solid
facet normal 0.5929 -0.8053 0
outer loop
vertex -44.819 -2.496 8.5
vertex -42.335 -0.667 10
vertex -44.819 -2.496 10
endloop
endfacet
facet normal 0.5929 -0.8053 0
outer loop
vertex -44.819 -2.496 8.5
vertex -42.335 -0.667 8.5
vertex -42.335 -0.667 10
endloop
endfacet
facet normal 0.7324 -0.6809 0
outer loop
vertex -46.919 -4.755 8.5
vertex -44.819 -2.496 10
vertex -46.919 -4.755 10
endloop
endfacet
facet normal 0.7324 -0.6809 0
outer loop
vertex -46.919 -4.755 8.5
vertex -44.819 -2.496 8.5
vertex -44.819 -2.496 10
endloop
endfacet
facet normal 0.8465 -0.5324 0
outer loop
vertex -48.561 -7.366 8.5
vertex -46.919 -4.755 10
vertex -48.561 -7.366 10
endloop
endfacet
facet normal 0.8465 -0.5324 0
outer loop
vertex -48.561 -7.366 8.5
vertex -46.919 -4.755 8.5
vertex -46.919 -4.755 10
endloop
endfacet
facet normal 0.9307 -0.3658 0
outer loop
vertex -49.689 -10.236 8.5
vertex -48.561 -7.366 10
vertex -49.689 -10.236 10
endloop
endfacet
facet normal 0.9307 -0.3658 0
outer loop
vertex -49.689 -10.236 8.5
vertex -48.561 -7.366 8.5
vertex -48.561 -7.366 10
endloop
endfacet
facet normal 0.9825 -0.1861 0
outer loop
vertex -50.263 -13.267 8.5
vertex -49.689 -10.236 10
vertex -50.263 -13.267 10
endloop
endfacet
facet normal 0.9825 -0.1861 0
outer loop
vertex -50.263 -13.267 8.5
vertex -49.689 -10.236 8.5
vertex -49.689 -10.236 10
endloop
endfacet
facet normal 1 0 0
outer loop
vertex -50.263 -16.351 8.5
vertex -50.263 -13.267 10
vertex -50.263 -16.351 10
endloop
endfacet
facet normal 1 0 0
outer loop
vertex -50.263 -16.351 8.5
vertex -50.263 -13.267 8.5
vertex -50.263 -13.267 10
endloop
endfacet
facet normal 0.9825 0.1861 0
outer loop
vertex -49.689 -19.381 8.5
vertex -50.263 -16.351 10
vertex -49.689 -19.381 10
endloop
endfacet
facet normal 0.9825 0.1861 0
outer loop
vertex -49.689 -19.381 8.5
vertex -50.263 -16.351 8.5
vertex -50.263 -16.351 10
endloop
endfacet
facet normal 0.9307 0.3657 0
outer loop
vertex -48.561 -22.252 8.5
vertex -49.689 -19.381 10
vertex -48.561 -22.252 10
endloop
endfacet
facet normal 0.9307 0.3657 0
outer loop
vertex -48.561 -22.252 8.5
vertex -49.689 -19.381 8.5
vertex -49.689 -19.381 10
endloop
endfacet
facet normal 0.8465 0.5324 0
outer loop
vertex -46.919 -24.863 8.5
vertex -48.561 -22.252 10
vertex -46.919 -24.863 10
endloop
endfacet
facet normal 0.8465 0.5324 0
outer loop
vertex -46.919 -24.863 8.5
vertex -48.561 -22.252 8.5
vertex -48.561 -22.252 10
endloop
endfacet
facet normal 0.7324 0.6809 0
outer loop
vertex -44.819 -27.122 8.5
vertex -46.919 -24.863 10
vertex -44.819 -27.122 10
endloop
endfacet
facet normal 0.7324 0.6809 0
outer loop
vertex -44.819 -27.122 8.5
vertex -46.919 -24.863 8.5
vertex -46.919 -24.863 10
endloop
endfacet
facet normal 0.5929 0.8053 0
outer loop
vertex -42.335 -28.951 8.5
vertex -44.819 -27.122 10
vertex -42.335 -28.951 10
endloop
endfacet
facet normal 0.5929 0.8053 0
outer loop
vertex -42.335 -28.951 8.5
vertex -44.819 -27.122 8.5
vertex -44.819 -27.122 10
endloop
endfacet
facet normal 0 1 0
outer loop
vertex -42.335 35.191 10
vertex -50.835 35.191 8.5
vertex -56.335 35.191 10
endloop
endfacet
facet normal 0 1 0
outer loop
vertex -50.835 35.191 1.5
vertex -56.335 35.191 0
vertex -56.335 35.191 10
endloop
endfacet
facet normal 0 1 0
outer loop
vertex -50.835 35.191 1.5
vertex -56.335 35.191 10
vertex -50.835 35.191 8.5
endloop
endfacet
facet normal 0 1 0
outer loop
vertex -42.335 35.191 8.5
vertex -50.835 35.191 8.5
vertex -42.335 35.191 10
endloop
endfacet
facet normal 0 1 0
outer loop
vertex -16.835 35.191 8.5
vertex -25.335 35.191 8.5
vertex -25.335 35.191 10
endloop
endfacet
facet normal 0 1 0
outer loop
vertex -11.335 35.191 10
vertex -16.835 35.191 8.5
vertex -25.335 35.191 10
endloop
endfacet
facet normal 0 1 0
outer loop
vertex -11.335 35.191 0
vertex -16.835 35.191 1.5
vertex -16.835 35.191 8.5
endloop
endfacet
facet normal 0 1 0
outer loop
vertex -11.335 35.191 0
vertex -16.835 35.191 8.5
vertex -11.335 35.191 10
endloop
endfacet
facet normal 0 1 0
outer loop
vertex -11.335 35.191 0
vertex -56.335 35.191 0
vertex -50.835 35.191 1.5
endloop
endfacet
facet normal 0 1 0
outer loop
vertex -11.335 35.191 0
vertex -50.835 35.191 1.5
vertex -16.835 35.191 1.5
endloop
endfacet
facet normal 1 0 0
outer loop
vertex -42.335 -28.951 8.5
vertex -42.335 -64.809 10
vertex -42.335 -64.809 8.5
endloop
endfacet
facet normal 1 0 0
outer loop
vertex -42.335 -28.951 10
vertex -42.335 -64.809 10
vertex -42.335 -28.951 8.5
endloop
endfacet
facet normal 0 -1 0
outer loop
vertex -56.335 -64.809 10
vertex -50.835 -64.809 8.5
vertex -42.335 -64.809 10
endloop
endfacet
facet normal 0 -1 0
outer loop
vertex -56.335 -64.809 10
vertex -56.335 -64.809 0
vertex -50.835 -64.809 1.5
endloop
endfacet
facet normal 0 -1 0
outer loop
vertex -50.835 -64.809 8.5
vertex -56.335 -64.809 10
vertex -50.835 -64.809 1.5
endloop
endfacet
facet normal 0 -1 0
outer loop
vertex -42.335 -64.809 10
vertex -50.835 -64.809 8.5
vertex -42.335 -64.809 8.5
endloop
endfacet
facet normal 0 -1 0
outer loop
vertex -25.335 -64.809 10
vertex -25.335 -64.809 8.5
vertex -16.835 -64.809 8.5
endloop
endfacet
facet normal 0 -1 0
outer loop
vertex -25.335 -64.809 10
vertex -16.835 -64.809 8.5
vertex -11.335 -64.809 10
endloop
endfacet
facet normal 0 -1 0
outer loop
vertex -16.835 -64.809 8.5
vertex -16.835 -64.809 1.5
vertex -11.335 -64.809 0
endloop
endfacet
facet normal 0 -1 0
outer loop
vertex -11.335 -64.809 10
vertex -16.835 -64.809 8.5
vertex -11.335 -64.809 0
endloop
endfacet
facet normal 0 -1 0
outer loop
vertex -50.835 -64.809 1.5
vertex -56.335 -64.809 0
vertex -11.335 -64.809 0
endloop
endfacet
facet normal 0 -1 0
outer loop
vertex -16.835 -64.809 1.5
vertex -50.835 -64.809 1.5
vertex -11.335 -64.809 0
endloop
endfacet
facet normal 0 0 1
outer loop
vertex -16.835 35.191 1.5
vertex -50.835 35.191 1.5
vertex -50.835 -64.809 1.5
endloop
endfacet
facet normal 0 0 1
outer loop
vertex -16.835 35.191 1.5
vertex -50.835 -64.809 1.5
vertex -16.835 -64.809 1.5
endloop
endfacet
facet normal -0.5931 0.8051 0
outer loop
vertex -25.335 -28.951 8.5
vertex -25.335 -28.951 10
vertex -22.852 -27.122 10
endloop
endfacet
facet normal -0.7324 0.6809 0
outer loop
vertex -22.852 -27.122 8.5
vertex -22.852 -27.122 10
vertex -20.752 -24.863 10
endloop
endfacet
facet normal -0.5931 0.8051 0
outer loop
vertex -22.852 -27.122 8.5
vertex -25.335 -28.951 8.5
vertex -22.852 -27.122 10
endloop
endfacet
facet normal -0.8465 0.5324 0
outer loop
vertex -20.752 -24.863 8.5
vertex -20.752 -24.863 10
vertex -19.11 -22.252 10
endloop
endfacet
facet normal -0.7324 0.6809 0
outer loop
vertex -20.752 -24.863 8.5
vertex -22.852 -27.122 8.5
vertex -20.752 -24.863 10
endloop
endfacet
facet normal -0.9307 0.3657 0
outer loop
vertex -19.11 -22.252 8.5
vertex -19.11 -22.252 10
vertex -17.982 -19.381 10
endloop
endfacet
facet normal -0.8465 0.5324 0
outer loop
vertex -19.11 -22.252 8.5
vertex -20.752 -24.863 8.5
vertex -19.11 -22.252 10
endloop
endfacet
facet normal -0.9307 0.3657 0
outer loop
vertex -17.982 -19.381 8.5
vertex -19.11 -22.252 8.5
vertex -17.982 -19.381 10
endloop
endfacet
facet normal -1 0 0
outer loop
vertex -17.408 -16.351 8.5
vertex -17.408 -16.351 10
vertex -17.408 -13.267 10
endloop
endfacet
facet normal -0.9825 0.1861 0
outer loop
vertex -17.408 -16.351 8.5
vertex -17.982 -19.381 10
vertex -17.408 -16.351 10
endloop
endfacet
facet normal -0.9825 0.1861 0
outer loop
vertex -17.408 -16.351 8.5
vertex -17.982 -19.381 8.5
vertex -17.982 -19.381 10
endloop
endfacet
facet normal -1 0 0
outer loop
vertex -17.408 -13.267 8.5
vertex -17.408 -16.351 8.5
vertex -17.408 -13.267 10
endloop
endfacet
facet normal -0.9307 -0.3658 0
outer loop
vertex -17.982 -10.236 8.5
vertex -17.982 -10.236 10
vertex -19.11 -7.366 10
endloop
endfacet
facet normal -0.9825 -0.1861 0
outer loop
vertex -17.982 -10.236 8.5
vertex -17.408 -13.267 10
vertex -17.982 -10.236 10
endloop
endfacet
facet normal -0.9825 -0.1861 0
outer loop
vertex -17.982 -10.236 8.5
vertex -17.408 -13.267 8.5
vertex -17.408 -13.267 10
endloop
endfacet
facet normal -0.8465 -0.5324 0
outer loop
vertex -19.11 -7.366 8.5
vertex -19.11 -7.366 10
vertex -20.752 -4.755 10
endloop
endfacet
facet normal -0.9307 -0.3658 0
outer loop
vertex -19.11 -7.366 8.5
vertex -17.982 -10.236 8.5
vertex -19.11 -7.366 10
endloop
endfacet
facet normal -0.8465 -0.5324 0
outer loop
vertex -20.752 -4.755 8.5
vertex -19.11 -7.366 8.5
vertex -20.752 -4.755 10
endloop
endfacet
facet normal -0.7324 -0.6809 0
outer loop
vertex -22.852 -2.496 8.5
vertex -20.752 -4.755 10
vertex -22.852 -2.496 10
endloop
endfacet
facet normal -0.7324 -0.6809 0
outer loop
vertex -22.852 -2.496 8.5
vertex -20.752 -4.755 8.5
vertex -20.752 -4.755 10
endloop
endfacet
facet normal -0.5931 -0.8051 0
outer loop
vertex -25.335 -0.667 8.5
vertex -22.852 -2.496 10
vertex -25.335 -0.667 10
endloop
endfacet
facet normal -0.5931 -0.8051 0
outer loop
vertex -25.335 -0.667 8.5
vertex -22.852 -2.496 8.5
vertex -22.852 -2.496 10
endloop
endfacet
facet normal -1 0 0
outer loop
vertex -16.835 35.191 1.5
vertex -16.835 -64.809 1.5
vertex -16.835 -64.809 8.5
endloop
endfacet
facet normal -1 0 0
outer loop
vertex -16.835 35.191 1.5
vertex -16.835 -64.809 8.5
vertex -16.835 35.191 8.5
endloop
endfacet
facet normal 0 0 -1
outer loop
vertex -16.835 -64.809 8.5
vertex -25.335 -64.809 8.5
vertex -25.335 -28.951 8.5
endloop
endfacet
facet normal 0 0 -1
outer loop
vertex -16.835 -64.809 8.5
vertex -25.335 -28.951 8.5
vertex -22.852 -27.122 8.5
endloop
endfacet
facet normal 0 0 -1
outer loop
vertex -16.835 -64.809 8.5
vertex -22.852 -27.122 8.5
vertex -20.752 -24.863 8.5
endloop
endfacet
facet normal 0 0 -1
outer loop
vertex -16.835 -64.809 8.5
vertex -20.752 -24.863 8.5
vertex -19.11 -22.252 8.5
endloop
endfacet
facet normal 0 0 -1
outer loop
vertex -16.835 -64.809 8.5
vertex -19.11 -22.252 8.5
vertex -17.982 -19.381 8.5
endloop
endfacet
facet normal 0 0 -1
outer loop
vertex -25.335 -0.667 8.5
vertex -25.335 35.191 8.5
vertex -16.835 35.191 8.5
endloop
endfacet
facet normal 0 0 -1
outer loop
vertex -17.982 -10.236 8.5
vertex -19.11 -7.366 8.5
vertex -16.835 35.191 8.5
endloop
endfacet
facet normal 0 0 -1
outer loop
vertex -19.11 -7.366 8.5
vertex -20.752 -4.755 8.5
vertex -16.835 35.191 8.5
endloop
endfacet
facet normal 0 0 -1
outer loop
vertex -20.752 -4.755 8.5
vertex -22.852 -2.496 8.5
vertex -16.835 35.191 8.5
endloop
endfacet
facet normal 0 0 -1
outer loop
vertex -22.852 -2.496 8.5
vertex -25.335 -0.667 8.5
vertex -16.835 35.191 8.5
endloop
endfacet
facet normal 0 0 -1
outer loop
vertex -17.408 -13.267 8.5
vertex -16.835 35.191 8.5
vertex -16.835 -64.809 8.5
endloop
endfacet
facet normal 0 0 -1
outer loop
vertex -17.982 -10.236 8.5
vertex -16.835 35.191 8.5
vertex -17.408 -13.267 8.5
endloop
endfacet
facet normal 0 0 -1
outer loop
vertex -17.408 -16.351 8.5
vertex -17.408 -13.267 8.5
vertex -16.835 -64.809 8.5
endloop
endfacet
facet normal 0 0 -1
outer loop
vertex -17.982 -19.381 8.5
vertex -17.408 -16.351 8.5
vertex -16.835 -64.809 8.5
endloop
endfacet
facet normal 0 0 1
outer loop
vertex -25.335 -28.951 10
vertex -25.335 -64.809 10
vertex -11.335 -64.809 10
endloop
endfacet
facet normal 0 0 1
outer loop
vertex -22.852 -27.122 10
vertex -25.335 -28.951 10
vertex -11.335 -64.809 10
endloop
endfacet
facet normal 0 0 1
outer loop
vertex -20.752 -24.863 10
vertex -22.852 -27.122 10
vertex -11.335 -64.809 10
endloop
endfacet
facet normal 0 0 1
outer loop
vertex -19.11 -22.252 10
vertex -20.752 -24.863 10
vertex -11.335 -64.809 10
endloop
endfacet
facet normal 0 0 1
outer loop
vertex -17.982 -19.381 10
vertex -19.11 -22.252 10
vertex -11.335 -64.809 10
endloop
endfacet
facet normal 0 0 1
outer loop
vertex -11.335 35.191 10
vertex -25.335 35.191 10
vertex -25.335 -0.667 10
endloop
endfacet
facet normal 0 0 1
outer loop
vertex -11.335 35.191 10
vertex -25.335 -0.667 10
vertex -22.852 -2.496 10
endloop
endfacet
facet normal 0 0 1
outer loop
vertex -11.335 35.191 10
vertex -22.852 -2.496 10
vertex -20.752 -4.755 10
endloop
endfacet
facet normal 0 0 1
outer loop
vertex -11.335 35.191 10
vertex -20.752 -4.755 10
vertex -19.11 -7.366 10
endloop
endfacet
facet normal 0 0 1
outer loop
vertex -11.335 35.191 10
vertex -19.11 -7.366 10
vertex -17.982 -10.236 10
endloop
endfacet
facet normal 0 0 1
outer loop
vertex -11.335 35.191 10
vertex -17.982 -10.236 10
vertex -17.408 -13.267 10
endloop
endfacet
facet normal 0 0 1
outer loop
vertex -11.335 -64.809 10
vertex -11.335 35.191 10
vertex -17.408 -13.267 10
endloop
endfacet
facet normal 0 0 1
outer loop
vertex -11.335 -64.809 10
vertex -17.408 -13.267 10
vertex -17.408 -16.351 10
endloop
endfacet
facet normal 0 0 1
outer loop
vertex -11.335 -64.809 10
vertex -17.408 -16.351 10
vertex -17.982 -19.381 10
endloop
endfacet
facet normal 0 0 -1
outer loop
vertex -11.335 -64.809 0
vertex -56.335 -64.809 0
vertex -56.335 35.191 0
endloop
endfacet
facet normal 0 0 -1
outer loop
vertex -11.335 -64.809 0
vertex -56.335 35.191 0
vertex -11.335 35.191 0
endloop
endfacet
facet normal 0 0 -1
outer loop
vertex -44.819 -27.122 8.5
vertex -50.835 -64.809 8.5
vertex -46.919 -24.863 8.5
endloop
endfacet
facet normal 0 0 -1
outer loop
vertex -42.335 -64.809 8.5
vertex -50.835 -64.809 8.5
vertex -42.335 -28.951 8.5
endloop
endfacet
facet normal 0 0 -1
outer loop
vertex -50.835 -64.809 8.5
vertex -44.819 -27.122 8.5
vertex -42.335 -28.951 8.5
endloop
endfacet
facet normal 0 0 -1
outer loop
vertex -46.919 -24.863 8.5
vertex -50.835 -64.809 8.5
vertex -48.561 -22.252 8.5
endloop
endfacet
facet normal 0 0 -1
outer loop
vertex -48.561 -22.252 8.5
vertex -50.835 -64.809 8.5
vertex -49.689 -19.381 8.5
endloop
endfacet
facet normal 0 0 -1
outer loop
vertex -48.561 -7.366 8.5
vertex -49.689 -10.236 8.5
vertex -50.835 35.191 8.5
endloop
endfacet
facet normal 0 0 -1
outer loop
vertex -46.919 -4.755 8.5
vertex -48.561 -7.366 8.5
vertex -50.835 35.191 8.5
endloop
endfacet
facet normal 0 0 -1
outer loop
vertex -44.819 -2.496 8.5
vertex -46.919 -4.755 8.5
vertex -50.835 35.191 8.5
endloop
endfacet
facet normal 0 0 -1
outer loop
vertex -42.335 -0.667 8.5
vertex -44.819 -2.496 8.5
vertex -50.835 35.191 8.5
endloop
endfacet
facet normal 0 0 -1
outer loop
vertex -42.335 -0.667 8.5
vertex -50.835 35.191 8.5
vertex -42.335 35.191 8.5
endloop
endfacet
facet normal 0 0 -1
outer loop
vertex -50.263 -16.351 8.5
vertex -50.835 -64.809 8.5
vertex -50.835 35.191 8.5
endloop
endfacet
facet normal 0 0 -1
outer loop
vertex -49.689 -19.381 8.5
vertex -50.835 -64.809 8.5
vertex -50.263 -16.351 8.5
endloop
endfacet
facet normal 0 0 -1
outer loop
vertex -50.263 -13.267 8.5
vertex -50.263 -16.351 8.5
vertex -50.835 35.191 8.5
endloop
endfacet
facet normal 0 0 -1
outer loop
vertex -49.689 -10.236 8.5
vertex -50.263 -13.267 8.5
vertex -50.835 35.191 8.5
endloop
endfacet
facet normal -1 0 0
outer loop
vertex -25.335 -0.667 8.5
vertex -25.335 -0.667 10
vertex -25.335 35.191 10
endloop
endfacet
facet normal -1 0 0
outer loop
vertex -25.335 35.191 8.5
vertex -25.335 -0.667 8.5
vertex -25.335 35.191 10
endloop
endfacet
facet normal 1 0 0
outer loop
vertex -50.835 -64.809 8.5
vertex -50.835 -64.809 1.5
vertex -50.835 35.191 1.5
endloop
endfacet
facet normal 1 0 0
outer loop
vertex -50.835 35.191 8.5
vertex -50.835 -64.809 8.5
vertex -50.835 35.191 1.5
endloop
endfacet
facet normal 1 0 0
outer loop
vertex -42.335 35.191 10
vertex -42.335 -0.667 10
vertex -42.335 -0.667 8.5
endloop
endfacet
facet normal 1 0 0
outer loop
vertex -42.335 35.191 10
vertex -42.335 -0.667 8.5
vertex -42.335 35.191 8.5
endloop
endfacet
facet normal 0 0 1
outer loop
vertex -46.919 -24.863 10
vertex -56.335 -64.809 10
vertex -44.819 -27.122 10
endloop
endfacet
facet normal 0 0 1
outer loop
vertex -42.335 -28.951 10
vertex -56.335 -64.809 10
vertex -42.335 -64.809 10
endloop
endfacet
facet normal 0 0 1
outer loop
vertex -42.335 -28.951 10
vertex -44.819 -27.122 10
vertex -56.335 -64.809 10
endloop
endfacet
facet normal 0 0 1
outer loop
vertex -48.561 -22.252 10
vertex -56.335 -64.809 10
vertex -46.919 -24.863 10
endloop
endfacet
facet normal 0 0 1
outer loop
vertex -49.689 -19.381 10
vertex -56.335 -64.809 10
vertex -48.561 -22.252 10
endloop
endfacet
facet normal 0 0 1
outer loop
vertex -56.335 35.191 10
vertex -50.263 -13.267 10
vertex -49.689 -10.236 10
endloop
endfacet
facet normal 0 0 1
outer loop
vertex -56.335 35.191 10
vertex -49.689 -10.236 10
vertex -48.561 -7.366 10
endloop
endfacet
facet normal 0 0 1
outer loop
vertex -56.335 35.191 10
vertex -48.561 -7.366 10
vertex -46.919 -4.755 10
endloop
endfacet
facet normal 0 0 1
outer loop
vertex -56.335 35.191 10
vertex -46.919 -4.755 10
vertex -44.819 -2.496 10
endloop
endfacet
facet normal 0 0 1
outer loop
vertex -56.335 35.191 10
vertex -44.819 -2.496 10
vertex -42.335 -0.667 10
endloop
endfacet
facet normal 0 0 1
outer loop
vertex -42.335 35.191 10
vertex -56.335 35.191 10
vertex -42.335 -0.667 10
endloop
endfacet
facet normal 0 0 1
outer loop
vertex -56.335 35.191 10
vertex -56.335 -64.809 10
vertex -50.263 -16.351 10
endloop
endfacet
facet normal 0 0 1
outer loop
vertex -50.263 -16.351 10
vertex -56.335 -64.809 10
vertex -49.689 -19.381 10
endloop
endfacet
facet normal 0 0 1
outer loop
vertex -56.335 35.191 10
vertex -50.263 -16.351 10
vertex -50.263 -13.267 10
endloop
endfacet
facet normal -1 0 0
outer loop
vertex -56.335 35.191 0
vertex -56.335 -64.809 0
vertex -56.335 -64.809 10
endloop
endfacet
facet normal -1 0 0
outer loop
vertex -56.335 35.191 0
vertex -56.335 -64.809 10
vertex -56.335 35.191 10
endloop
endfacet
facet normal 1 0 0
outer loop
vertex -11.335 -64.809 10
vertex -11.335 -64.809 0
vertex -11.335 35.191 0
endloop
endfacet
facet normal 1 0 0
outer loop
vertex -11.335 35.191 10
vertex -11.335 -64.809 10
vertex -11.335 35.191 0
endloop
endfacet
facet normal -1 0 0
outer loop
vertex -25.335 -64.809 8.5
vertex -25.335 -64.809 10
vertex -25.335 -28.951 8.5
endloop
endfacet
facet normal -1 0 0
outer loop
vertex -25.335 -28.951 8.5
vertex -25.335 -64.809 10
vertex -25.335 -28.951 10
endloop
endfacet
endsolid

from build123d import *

# Parameters (mm, degrees)
F0_W     = 45
F0_H     = 100
F1_DEPTH = 10
F2_W     = 17
F2_H     = 100
F3_DEPTH = 8.5
F4_W     = 34
F4_H     = 100
F5_DEPTH = 7
F8_R     = 16.5
F9_DEPTH = 10


with BuildPart() as f1:
    # F0 (on Top) → F1 (new body)
    with BuildSketch(Plane.XY):
        with Locations((-33.835356, -14.808846)):
            Rectangle(F0_W, F0_H)
    extrude(amount=F1_DEPTH)

    # F2 (on face) → F3 (cut)
    with BuildSketch(Plane.XY.offset(10)):
        with Locations((-33.835356, -14.808846)):
            Rectangle(F2_W, F2_H)
    extrude(amount=-F3_DEPTH, mode=Mode.SUBTRACT)


with BuildPart() as f5:
    # F4 (on Top) → F5 (new body)
    with BuildSketch(Plane.XY):
        with Locations((-39.335356, -14.808846)):
            Rectangle(F4_W, F4_H)
    extrude(amount=F5_DEPTH)


with BuildPart() as f5_1:
    # F6: moved
    add(f5.part.moved(Location((5.5, 0, 1.5))))


with BuildPart() as f1_1:
    add(f1.part)

    # F7: cut F5
    add(f5_1.part, mode=Mode.SUBTRACT)


with BuildPart() as f9:
    # F8 (on Top) → F9 (new body)
    with BuildSketch(Plane.XY):
        with Locations((-33.835356, -64.808846)):
            Circle(F8_R)
    extrude(amount=F9_DEPTH)


with BuildPart() as f9_1:
    # F10: moved
    add(f9.part.moved(Location((0, 50, 4))))


with BuildPart() as f1_2:
    add(f1_1.part)

    # F11: cut F9
    add(f9_1.part, mode=Mode.SUBTRACT)


solid = f1_2.part
